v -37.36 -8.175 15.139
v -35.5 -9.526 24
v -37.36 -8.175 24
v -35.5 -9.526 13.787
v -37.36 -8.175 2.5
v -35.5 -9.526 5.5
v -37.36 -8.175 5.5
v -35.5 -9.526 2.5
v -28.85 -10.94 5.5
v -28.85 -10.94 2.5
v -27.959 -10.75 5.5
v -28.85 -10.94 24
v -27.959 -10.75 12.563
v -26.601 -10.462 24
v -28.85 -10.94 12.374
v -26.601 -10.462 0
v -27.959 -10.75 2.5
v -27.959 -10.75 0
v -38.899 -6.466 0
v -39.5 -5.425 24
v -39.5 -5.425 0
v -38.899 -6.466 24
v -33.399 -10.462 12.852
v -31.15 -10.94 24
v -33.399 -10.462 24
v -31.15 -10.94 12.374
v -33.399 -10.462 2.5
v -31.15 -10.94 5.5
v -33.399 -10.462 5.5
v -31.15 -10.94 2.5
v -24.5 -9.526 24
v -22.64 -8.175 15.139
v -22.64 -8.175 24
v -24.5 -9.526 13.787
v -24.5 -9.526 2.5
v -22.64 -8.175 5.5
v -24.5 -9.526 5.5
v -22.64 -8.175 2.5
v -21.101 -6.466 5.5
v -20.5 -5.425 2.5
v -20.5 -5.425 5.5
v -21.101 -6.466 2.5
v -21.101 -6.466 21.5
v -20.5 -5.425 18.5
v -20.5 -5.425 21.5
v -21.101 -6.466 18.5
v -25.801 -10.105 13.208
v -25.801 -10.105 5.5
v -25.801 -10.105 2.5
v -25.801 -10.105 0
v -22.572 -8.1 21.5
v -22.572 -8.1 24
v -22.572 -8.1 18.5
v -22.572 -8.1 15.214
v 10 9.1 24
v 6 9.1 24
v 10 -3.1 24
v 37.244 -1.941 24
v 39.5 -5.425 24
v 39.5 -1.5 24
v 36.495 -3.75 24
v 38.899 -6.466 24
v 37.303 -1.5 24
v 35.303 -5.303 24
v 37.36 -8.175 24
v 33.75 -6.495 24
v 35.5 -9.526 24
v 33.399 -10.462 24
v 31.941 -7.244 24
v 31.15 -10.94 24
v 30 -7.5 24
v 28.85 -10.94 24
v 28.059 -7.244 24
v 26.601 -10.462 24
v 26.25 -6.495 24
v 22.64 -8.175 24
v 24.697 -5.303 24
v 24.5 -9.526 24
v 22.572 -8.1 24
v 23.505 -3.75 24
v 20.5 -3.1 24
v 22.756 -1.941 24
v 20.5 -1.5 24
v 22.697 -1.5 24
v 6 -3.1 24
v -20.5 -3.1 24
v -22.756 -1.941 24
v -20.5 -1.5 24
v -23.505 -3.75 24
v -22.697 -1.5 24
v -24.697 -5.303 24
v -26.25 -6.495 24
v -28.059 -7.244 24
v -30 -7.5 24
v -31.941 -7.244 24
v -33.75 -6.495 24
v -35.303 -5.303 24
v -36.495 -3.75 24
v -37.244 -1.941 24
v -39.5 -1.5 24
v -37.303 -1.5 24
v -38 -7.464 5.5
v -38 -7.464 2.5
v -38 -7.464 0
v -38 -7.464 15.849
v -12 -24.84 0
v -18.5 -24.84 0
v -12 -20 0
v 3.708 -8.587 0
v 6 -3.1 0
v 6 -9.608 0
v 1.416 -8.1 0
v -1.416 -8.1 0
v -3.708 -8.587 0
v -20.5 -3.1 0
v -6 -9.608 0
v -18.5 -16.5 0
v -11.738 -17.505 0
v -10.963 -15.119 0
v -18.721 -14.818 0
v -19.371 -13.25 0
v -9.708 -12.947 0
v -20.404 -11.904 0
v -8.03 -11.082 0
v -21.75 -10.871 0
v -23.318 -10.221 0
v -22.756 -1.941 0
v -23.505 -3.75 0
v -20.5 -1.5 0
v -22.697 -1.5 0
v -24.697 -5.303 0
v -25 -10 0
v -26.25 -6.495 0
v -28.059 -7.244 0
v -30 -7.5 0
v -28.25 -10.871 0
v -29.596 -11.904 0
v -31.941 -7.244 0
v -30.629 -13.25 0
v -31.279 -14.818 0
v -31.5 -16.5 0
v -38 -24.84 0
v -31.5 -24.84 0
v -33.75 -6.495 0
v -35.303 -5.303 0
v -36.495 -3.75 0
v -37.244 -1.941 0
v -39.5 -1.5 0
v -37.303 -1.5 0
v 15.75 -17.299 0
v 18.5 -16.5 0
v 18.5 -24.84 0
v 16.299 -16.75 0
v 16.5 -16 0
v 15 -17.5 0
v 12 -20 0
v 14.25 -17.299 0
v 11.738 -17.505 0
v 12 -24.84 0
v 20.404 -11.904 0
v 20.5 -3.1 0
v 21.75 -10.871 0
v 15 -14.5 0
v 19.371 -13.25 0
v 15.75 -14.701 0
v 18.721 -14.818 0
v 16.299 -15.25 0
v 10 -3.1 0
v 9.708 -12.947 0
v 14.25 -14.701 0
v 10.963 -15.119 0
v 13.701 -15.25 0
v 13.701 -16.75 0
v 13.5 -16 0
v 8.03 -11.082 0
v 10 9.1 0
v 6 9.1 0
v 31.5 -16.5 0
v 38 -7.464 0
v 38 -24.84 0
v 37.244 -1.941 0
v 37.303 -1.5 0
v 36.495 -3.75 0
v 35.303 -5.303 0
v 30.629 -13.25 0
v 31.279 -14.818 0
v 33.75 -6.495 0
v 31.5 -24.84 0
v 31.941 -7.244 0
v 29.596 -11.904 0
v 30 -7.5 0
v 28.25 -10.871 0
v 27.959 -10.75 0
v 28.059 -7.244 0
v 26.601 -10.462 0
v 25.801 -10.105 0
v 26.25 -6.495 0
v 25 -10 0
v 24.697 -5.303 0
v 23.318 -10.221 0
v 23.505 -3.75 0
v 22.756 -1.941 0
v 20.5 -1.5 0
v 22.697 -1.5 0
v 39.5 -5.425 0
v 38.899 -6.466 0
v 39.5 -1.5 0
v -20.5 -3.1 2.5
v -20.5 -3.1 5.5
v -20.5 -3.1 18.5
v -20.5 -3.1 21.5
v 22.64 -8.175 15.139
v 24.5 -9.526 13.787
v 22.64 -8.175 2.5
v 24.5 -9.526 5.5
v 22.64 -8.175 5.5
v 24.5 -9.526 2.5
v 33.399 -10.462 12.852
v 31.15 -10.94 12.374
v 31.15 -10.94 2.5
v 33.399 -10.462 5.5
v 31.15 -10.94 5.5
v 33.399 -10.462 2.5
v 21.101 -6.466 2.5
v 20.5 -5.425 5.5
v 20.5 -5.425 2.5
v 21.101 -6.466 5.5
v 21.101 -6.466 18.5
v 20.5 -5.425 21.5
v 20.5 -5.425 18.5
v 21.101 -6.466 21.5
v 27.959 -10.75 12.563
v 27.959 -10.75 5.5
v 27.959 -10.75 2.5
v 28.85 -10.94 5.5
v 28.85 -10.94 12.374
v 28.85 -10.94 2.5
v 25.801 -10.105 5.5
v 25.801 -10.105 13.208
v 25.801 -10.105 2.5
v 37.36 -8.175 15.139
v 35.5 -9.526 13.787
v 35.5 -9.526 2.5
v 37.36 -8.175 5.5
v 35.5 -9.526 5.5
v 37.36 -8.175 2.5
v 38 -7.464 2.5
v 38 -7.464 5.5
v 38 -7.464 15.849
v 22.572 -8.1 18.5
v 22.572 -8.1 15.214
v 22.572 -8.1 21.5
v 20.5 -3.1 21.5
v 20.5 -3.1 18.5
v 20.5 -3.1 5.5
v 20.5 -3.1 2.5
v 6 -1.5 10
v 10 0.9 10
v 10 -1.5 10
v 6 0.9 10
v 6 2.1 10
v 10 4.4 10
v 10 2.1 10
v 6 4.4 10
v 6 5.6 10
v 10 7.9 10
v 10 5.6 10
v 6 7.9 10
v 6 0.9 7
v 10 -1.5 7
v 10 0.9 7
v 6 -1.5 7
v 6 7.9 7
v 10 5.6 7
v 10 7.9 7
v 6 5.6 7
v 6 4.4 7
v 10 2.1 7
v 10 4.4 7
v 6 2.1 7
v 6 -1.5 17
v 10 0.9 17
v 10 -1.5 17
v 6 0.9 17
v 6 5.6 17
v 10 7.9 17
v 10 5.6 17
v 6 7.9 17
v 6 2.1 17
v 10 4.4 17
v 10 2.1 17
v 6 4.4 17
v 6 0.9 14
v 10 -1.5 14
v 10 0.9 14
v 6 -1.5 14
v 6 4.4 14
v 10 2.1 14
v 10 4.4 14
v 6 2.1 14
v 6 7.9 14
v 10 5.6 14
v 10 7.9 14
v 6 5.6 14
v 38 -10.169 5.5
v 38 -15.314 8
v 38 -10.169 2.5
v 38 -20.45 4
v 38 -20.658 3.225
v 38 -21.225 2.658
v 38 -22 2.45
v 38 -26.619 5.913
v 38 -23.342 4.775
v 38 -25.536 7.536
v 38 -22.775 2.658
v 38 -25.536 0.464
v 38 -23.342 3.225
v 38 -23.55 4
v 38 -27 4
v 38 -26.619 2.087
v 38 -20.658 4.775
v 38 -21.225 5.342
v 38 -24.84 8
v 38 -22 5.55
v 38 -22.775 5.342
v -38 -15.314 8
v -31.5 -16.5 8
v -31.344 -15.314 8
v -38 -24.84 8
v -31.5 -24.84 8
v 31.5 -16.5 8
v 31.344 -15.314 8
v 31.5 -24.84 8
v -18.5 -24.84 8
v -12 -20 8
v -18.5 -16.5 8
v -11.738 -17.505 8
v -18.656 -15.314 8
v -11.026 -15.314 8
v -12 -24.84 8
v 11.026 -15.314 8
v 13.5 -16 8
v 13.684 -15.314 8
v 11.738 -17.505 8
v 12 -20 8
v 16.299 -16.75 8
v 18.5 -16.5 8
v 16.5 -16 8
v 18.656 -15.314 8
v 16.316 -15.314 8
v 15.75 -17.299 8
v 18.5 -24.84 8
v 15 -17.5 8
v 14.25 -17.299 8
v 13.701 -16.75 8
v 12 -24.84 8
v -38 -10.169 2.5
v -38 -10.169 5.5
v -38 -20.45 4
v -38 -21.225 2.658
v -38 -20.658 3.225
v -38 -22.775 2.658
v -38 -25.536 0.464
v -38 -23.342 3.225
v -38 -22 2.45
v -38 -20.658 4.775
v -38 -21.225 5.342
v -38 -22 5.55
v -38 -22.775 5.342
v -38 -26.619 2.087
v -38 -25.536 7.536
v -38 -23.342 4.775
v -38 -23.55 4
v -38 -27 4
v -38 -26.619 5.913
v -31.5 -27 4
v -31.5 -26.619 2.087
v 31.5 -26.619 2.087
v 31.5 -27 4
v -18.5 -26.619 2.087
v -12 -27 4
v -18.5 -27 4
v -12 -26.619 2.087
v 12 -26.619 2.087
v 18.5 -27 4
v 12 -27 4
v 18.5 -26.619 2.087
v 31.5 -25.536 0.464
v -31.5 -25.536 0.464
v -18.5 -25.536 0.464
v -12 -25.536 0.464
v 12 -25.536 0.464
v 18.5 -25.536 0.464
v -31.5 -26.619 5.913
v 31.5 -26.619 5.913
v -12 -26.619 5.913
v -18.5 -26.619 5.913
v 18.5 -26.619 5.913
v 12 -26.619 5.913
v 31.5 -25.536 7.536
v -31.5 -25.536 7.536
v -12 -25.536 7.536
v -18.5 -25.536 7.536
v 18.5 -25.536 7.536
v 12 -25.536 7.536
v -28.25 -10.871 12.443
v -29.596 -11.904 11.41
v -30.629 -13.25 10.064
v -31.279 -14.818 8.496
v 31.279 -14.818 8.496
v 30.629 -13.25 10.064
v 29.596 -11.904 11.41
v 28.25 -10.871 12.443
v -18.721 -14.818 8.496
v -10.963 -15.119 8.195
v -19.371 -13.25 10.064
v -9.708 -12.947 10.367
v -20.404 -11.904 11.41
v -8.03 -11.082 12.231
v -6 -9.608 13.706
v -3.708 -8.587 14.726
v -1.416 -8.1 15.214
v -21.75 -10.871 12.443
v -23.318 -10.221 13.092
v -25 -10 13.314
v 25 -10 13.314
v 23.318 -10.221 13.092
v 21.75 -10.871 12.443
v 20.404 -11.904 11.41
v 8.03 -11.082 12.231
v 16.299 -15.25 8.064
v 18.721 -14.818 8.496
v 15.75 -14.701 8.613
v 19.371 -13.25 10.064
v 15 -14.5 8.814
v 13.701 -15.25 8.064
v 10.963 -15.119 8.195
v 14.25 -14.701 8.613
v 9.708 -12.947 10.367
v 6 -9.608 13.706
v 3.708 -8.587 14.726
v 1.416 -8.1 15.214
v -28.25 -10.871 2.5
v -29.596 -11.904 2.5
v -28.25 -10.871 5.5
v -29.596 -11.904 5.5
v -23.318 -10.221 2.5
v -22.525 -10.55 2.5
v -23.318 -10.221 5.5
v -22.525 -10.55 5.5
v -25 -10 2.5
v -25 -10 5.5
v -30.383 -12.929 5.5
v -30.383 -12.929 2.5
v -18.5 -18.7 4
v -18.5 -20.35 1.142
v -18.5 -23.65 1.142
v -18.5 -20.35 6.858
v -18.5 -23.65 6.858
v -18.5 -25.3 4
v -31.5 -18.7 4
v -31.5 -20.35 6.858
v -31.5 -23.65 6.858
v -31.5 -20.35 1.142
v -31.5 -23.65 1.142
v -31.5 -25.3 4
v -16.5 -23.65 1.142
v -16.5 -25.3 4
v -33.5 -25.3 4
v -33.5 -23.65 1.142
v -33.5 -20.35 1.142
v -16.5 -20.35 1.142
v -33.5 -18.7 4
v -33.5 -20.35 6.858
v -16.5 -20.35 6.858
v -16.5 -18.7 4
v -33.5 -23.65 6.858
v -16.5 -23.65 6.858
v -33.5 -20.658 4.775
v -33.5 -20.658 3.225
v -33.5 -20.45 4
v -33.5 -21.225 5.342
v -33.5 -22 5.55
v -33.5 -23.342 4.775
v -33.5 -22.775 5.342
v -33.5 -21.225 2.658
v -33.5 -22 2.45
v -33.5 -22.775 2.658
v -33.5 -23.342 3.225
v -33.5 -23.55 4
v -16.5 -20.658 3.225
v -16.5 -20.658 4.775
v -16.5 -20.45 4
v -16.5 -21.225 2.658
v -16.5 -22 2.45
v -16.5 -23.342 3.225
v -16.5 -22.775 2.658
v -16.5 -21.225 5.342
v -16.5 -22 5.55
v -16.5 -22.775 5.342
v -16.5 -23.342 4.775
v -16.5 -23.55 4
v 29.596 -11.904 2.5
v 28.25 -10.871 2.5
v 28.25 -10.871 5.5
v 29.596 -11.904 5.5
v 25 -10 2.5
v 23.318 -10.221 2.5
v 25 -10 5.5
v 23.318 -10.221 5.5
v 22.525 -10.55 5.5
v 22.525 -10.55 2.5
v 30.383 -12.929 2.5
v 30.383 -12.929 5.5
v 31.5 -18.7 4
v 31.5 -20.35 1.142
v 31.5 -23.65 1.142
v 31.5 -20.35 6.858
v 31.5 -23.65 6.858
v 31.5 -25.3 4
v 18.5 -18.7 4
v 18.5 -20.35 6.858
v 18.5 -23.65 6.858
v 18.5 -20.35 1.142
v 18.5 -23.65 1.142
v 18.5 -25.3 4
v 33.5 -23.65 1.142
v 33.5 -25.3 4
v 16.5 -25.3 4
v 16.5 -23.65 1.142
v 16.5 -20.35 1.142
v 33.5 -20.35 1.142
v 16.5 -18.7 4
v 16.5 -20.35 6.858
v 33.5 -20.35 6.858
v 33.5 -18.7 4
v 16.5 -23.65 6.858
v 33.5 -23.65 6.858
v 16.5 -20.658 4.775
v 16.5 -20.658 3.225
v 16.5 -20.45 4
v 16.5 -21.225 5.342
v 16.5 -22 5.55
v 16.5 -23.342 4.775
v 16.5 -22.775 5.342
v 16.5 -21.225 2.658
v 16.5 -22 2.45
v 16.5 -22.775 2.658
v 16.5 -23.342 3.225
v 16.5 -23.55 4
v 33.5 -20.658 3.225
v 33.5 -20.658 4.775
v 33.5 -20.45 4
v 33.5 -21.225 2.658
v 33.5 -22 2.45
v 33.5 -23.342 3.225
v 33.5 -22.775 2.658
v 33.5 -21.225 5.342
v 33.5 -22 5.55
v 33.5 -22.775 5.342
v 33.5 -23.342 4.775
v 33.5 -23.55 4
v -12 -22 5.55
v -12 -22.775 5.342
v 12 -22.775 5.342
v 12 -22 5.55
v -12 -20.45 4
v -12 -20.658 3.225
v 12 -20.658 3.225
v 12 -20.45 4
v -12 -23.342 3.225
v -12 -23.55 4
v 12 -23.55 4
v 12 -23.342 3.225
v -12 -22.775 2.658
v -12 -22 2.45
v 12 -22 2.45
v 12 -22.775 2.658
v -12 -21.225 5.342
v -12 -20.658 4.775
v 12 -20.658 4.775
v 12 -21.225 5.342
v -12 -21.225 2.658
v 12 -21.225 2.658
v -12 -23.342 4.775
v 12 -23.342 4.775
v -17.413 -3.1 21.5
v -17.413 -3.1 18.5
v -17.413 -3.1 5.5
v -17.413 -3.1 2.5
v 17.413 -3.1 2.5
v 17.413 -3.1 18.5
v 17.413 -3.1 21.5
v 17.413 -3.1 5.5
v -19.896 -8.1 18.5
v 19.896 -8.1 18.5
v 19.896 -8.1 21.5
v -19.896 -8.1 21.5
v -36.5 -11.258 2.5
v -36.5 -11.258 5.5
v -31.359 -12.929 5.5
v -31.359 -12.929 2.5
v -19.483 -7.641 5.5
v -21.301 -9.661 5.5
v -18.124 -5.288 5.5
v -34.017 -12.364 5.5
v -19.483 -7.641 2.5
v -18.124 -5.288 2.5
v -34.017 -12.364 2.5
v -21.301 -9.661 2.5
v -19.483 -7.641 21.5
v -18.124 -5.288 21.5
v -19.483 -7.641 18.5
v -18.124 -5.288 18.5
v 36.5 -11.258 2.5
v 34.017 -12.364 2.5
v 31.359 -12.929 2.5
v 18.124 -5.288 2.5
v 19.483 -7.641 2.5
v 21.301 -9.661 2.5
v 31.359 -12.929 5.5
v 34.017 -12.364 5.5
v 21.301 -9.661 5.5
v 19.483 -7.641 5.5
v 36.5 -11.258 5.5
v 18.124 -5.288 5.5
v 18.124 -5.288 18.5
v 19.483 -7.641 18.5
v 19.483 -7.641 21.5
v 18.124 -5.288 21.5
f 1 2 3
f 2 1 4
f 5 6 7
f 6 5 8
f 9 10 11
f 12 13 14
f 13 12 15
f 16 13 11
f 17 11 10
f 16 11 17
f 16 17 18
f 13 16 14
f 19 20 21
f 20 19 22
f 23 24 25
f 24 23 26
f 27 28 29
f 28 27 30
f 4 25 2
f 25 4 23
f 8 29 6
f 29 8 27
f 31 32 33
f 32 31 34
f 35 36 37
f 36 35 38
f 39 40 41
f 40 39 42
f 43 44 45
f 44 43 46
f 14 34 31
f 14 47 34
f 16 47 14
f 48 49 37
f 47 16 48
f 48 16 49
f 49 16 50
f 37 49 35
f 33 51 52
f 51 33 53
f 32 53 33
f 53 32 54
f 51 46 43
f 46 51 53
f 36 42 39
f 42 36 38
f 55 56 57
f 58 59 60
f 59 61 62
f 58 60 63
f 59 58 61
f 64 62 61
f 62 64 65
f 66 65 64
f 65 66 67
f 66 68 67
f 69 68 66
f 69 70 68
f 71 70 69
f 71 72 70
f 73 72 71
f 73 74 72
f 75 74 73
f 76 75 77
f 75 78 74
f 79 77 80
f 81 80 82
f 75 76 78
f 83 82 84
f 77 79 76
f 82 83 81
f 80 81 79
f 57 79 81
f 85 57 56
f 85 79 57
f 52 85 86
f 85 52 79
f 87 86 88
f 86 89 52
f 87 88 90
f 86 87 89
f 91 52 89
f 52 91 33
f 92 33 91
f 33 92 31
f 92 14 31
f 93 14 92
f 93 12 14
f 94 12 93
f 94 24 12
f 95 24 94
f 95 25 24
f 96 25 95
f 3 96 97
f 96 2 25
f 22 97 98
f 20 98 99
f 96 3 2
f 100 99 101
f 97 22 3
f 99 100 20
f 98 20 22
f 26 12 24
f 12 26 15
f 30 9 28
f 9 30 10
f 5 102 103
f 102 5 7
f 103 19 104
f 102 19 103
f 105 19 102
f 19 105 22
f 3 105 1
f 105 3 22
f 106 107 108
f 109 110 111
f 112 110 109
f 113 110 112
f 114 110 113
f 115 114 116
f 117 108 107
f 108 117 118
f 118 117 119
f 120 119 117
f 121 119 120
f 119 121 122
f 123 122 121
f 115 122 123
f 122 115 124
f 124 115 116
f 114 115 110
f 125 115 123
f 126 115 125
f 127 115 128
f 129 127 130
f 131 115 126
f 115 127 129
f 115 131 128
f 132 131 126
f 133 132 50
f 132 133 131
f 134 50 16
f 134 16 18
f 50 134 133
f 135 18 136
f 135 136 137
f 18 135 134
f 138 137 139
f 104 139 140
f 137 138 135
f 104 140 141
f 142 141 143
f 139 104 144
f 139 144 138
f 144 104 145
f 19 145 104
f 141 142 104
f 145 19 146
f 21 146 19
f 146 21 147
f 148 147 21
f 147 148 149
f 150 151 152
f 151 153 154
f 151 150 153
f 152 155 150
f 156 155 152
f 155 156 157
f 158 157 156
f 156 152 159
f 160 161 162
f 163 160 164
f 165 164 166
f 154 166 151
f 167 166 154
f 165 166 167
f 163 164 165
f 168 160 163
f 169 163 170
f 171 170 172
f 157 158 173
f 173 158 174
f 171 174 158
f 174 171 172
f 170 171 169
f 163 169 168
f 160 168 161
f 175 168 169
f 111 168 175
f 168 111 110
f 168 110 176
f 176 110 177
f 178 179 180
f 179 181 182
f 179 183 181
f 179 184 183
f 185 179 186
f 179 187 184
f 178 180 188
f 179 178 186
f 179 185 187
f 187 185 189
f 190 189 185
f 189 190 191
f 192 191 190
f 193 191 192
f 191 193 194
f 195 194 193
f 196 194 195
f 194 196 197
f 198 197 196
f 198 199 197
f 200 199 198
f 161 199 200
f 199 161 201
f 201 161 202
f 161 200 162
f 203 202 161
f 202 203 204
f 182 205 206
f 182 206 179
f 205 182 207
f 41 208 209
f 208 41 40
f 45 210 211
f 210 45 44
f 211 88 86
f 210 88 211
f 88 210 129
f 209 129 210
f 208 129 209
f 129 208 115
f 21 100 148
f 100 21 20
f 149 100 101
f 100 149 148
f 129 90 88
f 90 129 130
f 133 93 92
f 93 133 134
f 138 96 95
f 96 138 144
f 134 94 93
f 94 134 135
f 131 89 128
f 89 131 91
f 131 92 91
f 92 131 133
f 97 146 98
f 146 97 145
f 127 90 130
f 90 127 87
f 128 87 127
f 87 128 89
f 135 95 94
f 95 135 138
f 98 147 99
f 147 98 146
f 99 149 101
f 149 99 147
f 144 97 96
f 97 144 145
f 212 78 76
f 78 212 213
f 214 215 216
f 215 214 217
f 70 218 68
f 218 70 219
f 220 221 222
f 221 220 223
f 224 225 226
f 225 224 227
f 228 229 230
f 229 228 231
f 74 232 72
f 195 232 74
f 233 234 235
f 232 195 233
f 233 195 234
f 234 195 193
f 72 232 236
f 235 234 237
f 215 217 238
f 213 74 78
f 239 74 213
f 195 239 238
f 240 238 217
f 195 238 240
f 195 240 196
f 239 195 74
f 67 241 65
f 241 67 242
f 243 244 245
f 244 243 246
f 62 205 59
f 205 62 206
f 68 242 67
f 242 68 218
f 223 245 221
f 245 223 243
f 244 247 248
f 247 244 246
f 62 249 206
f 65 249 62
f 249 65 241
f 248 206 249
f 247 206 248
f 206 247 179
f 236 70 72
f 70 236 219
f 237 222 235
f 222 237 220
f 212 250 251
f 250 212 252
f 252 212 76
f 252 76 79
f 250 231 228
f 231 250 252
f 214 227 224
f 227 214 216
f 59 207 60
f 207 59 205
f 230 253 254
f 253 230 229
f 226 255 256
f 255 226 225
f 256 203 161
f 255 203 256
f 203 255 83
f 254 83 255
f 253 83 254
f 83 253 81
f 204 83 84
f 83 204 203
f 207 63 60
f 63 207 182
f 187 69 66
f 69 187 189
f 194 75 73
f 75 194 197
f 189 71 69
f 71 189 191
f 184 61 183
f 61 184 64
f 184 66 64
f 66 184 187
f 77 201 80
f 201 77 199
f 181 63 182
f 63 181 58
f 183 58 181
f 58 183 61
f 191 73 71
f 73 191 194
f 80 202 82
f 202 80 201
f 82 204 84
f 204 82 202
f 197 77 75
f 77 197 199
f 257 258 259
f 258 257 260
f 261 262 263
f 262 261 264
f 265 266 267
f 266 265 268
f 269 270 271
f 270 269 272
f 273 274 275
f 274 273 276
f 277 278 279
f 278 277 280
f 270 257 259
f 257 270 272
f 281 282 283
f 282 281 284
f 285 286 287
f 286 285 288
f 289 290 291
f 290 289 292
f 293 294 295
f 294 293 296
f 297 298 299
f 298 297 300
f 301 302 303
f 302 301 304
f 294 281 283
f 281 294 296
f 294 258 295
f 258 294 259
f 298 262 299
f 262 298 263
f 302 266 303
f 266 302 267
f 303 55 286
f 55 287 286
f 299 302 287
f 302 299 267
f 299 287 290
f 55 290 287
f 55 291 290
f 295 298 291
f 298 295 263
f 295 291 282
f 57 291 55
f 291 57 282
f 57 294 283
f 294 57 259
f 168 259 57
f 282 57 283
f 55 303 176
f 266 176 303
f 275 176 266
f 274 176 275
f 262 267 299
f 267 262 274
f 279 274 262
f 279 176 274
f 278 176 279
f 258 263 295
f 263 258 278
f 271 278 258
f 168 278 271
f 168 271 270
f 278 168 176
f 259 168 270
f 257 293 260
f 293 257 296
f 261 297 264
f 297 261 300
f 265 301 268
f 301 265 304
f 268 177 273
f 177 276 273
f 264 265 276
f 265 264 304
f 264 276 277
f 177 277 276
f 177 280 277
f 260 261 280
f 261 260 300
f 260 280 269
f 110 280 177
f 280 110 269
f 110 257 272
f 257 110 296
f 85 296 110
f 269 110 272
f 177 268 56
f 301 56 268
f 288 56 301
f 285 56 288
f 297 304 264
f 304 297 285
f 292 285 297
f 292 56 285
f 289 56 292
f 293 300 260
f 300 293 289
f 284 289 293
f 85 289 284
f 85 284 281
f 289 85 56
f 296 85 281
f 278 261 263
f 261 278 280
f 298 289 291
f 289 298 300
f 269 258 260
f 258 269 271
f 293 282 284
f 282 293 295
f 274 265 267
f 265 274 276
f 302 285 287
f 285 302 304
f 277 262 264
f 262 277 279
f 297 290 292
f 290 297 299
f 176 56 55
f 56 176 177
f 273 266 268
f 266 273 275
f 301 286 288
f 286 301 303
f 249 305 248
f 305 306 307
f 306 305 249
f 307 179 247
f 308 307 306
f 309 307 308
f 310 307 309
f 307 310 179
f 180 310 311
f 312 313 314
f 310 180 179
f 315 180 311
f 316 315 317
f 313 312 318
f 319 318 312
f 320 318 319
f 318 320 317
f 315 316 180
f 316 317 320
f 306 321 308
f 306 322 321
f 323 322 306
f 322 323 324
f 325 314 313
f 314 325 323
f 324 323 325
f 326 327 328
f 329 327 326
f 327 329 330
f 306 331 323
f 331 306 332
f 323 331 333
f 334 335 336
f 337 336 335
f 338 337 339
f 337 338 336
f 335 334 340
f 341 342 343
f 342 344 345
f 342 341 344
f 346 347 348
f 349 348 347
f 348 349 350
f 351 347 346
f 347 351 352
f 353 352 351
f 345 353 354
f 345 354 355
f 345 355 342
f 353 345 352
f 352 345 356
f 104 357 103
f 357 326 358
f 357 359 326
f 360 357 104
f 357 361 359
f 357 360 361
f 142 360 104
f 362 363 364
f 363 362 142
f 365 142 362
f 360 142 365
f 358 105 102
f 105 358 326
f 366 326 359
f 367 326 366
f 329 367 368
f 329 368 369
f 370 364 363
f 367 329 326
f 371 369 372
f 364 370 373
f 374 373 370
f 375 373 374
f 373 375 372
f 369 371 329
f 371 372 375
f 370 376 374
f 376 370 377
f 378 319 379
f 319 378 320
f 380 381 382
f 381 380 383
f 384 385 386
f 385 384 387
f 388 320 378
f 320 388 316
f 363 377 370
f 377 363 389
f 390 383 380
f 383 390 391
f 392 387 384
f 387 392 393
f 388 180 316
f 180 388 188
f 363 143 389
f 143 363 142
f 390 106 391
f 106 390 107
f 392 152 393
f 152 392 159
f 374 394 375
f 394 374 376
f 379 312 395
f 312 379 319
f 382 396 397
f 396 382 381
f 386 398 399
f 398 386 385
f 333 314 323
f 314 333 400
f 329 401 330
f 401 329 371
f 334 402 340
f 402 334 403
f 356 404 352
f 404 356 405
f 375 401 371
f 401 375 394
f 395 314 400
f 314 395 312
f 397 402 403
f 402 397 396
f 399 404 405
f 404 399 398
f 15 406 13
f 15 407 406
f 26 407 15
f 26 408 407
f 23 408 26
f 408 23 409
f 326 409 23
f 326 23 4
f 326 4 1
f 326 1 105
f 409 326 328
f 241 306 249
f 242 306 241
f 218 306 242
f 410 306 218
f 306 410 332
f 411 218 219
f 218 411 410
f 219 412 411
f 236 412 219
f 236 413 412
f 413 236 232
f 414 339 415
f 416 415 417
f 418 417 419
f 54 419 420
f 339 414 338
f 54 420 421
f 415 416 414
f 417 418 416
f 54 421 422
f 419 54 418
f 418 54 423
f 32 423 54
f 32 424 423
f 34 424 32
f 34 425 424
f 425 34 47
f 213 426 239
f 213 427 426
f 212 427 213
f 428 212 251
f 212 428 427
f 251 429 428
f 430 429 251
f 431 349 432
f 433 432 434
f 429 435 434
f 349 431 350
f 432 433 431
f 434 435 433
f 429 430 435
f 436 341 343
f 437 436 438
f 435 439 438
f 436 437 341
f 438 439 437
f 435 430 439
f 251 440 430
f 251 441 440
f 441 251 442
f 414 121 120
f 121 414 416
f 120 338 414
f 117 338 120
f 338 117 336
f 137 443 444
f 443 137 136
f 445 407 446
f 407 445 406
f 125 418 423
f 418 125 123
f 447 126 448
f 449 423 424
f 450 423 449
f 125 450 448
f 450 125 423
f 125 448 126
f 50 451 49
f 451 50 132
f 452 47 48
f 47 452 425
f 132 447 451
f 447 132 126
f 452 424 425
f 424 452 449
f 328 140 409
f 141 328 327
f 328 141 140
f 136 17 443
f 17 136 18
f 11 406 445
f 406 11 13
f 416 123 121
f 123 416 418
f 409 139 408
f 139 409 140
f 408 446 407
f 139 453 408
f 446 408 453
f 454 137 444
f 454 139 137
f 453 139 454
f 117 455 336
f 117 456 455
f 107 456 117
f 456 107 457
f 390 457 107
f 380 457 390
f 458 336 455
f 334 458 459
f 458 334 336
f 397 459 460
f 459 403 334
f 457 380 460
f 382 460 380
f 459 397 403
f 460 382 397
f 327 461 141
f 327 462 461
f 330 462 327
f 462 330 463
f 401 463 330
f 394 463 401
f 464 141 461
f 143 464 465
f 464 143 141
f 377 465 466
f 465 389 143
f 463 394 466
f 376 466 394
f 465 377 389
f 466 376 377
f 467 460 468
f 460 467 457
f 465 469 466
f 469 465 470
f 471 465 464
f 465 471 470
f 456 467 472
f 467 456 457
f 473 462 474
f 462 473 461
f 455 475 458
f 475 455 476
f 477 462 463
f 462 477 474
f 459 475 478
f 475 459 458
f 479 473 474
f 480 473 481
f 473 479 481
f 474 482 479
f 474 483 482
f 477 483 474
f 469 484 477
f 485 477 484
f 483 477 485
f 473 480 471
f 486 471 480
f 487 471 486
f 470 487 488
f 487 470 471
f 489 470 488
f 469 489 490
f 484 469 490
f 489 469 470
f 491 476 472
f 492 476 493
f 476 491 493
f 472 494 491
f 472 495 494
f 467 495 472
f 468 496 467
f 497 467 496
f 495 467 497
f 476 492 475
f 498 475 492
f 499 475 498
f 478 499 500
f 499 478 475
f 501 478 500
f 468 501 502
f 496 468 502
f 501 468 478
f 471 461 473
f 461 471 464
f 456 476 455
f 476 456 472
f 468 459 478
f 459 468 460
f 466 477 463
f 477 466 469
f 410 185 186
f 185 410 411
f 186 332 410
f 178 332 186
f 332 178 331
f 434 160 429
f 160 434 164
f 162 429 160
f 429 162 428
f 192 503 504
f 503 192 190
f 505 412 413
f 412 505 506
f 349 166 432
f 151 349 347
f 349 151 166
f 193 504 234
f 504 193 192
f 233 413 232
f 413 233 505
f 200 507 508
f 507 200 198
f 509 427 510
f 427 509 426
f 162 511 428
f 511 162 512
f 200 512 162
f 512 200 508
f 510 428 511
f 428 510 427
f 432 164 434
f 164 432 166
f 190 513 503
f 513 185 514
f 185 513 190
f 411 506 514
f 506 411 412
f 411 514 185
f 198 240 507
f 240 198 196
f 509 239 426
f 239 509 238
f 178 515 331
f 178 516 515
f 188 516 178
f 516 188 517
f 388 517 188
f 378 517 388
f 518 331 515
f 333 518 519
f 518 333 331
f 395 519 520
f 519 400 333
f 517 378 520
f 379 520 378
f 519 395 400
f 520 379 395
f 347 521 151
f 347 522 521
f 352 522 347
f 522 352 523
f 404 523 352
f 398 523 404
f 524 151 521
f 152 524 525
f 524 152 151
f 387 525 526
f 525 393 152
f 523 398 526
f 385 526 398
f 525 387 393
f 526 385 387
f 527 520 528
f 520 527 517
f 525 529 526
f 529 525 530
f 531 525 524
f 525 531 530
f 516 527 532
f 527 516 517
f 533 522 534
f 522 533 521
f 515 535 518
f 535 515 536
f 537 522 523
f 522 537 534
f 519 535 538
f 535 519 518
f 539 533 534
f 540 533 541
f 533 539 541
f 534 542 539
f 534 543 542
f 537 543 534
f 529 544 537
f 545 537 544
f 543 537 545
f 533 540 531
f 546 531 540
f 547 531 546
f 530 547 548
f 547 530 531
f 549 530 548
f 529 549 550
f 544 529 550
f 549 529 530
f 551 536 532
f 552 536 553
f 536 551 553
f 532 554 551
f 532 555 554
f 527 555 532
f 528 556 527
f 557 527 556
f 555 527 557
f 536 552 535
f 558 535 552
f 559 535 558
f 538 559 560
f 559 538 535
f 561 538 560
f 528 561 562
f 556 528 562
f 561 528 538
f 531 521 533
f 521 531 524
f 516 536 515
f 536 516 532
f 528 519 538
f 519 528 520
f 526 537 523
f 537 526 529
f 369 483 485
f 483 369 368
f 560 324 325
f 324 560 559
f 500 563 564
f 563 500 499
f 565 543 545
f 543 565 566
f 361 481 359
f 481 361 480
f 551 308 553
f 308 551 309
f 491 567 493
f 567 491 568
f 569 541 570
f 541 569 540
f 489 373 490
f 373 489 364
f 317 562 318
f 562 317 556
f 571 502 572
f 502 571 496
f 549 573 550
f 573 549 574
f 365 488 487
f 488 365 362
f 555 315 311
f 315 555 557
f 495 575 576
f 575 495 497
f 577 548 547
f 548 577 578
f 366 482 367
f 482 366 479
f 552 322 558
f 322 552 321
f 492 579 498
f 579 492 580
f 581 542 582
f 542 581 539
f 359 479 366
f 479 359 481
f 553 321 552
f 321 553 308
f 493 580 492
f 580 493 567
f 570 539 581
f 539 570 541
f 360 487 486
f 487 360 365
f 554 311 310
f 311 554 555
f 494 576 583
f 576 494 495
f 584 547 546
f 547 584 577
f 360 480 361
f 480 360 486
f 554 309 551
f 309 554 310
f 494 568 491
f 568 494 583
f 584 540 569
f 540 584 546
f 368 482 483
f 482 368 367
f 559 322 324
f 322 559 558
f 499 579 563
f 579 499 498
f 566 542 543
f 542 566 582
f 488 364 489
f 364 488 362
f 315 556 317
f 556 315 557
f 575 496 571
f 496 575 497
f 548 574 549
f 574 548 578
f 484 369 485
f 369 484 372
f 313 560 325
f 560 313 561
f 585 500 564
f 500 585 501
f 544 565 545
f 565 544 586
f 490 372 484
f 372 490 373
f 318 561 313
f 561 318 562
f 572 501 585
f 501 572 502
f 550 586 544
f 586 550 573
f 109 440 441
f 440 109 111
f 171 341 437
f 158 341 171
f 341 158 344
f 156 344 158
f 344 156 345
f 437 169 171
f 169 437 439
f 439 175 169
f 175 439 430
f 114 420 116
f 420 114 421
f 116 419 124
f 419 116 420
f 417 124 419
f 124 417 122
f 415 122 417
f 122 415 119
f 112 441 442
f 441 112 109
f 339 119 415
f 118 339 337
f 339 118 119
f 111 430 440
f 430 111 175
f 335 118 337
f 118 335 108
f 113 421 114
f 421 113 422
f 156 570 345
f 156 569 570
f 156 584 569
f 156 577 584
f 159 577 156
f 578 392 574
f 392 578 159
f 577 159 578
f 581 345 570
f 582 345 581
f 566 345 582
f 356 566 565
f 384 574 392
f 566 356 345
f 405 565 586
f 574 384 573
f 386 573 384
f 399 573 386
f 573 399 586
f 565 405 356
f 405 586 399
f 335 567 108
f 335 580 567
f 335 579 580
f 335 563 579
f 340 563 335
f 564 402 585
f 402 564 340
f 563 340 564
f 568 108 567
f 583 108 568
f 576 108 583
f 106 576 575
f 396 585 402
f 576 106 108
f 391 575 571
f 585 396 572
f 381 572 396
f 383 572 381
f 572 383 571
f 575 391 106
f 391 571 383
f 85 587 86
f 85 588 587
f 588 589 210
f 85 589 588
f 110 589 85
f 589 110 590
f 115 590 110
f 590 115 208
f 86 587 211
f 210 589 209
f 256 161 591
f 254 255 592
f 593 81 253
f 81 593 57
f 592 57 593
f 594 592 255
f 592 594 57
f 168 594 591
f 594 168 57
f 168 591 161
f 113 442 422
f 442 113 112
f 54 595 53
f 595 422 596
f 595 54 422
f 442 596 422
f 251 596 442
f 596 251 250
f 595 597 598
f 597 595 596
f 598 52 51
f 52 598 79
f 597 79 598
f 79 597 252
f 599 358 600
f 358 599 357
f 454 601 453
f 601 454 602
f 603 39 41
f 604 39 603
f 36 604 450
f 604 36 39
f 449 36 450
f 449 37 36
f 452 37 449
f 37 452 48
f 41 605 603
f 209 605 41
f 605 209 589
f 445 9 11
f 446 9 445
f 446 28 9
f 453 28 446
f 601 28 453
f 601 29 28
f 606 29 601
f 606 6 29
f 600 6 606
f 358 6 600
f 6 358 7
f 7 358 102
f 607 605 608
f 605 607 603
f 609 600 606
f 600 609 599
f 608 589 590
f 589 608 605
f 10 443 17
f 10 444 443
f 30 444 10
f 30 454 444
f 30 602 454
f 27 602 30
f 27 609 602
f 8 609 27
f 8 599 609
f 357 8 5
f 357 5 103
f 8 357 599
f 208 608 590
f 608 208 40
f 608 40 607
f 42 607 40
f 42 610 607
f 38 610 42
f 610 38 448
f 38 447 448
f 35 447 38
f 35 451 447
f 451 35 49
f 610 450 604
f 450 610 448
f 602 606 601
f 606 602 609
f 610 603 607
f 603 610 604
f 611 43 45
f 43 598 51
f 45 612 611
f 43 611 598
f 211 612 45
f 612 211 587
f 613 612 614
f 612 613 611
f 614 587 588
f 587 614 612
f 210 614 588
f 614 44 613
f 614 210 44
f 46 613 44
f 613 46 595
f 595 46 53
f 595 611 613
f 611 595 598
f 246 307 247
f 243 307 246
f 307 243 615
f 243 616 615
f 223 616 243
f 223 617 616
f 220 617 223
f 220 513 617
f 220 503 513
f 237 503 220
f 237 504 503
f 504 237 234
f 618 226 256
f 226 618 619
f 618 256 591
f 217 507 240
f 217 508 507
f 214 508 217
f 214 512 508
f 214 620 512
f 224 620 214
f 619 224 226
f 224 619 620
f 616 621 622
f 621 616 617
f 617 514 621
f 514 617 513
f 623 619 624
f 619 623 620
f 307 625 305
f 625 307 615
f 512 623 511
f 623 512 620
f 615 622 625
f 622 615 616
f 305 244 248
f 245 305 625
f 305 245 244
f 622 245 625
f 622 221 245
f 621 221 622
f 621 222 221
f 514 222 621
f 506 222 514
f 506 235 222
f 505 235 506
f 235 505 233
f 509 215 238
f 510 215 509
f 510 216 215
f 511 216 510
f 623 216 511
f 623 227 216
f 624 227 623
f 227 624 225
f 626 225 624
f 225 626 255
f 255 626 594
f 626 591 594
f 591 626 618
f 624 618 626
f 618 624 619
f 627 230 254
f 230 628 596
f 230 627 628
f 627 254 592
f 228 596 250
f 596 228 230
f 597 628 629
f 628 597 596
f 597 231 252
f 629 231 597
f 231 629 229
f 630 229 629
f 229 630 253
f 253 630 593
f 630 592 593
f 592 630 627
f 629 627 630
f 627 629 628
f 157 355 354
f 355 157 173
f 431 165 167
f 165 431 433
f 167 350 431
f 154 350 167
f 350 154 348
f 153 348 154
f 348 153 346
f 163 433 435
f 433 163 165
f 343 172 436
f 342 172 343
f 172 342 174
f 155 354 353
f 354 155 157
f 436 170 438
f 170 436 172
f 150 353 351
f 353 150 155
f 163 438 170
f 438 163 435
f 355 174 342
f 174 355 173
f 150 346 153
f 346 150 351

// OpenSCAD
// file: configuration.scad
motor_end_height=44;
idler_end_height=28;
carriage_height=24;

platform_thickness=8;

sanguinololu=false;					// places mounting holes for the Sanguinololu controller

carbon_rods=true;					// turns on option for carbon diagonal rods just for looks!

frame_thickness=6;   				// 6mm acrylic
pcb_thickness=2;					    // used for rendering PCB and approximating build volume

//smooth_rod_length=495;  			// determins vertical build height with 508 for 8" 
smooth_rod_length=620;  			

rod_diameter=8;						// might be interesting to have larger rods

platform_hinge_offset=33;

carriage_hinge_offset=22;             // default rostock mini platform

// 27 for mini-platform


// printrbed 155,155 for 6x6
//printbed=[155,155];  				
//printbed_screw_spacing=[146.5,147]; 

// prusa 8x8 platform
printbed=[214,214];
printbed_screw_spacing=[209,209];

tower_radius = printbed[0]*0.9;
rod_length=printbed[0]*1.2;

corner_radius=12;

frame_radius=(tower_radius-rod_diameter/2-corner_radius)/cos(30);
// main file
include <configuration.scad>

width = 76;
height = carriage_height;

offset = 25;
cutout = 13;
middle = 2*offset - width/2;

module parallel_joints(reinforced) {
  difference() {
    union() {
      intersection() {
        cube([width, 20, 8], center=true);
        rotate([0, 90, 0]) cylinder(r=5, h=width, center=true);
      }
      intersection() {
        translate([0, 18, 4]) rotate([45, 0, 0])
          cube([width, reinforced, reinforced], center=true);
        translate([0, 0, 20]) cube([width, 35, 40], center=true);
      }
      translate([0, 8, 0]) cube([width, 16, 8], center=true);
    }
    rotate([0, 90, 0]) cylinder(r=1.55, h=80, center=true, $fn=12);

    for (x = [-offset, offset]) {
      translate([x, 5.5, 0])
        cylinder(r=cutout/2, h=100, center=true, $fn=24);
      translate([x, -4.5, 0])
        cube([cutout, 20, 100], center=true);
      translate([x, 0, 0]) rotate([0, 90, 0]) rotate([0, 0, 30])
        cylinder(r=3.3, h=17, center=true, $fn=6);
    }
    translate([0, 2, 0]) cylinder(r=middle, h=100, center=true);
    translate([0, -8, 0]) cube([2*middle, 20, 100], center=true);
  }
}

module lm8uu_mount(d, h) {
  union() {
    difference() {
      intersection() {
        cylinder(r=11, h=h, center=true);
        translate([0, -8, 0]) cube([19, 13, h+1], center=true);
      }
      cylinder(r=d/2, h=h+1, center=true);
    }
  }
}

module belt_mount() {
  difference() {
    union() {
      difference() {
        translate([8, 2, 0]) cube([4, 13, height], center=true);
        for (z = [-3.5, 3.5])
          translate([8, 5, z])
            cube([5, 13, 3], center=true);
      }
      for (y = [1.5, 5, 8.5]) {
        translate([8, y, 0]) cube([4, 1.2, height], center=true);
      }
    }
  }
}

module carriage() {
  translate([0, 0, height/2]) 
  union() {
    for (x = [-30, 30]) {
      translate([x, 0, 0]) lm8uu_mount(d=15, h=24);
    }
    belt_mount();
    difference() {
      union() {
        translate([0, -5.6, 0])
          cube([50, 5, height], center=true);
        translate([0, -carriage_hinge_offset, -height/2+4])
          parallel_joints(16);
      }
      // Screw hole for adjustable top endstop.
      translate([15, -16, -height/2+4])
        cylinder(r=1.5, h=20, center=true, $fn=12);
      for (x = [-30, 30]) {
        translate([x, 0, 0])
          cylinder(r=8, h=height+1, center=true);
        // Zip tie tunnels.
        for (z = [-height/2+4, height/2-4])
          translate([x, 0, z])
            cylinder(r=13, h=3, center=true);
      }
    }
  }
}

carriage();

// Uncomment the following lines to check endstop alignment.
// use <idler_end.scad>;
// translate([0, 0, -20]) rotate([180, 0, 0]) idler_end();
